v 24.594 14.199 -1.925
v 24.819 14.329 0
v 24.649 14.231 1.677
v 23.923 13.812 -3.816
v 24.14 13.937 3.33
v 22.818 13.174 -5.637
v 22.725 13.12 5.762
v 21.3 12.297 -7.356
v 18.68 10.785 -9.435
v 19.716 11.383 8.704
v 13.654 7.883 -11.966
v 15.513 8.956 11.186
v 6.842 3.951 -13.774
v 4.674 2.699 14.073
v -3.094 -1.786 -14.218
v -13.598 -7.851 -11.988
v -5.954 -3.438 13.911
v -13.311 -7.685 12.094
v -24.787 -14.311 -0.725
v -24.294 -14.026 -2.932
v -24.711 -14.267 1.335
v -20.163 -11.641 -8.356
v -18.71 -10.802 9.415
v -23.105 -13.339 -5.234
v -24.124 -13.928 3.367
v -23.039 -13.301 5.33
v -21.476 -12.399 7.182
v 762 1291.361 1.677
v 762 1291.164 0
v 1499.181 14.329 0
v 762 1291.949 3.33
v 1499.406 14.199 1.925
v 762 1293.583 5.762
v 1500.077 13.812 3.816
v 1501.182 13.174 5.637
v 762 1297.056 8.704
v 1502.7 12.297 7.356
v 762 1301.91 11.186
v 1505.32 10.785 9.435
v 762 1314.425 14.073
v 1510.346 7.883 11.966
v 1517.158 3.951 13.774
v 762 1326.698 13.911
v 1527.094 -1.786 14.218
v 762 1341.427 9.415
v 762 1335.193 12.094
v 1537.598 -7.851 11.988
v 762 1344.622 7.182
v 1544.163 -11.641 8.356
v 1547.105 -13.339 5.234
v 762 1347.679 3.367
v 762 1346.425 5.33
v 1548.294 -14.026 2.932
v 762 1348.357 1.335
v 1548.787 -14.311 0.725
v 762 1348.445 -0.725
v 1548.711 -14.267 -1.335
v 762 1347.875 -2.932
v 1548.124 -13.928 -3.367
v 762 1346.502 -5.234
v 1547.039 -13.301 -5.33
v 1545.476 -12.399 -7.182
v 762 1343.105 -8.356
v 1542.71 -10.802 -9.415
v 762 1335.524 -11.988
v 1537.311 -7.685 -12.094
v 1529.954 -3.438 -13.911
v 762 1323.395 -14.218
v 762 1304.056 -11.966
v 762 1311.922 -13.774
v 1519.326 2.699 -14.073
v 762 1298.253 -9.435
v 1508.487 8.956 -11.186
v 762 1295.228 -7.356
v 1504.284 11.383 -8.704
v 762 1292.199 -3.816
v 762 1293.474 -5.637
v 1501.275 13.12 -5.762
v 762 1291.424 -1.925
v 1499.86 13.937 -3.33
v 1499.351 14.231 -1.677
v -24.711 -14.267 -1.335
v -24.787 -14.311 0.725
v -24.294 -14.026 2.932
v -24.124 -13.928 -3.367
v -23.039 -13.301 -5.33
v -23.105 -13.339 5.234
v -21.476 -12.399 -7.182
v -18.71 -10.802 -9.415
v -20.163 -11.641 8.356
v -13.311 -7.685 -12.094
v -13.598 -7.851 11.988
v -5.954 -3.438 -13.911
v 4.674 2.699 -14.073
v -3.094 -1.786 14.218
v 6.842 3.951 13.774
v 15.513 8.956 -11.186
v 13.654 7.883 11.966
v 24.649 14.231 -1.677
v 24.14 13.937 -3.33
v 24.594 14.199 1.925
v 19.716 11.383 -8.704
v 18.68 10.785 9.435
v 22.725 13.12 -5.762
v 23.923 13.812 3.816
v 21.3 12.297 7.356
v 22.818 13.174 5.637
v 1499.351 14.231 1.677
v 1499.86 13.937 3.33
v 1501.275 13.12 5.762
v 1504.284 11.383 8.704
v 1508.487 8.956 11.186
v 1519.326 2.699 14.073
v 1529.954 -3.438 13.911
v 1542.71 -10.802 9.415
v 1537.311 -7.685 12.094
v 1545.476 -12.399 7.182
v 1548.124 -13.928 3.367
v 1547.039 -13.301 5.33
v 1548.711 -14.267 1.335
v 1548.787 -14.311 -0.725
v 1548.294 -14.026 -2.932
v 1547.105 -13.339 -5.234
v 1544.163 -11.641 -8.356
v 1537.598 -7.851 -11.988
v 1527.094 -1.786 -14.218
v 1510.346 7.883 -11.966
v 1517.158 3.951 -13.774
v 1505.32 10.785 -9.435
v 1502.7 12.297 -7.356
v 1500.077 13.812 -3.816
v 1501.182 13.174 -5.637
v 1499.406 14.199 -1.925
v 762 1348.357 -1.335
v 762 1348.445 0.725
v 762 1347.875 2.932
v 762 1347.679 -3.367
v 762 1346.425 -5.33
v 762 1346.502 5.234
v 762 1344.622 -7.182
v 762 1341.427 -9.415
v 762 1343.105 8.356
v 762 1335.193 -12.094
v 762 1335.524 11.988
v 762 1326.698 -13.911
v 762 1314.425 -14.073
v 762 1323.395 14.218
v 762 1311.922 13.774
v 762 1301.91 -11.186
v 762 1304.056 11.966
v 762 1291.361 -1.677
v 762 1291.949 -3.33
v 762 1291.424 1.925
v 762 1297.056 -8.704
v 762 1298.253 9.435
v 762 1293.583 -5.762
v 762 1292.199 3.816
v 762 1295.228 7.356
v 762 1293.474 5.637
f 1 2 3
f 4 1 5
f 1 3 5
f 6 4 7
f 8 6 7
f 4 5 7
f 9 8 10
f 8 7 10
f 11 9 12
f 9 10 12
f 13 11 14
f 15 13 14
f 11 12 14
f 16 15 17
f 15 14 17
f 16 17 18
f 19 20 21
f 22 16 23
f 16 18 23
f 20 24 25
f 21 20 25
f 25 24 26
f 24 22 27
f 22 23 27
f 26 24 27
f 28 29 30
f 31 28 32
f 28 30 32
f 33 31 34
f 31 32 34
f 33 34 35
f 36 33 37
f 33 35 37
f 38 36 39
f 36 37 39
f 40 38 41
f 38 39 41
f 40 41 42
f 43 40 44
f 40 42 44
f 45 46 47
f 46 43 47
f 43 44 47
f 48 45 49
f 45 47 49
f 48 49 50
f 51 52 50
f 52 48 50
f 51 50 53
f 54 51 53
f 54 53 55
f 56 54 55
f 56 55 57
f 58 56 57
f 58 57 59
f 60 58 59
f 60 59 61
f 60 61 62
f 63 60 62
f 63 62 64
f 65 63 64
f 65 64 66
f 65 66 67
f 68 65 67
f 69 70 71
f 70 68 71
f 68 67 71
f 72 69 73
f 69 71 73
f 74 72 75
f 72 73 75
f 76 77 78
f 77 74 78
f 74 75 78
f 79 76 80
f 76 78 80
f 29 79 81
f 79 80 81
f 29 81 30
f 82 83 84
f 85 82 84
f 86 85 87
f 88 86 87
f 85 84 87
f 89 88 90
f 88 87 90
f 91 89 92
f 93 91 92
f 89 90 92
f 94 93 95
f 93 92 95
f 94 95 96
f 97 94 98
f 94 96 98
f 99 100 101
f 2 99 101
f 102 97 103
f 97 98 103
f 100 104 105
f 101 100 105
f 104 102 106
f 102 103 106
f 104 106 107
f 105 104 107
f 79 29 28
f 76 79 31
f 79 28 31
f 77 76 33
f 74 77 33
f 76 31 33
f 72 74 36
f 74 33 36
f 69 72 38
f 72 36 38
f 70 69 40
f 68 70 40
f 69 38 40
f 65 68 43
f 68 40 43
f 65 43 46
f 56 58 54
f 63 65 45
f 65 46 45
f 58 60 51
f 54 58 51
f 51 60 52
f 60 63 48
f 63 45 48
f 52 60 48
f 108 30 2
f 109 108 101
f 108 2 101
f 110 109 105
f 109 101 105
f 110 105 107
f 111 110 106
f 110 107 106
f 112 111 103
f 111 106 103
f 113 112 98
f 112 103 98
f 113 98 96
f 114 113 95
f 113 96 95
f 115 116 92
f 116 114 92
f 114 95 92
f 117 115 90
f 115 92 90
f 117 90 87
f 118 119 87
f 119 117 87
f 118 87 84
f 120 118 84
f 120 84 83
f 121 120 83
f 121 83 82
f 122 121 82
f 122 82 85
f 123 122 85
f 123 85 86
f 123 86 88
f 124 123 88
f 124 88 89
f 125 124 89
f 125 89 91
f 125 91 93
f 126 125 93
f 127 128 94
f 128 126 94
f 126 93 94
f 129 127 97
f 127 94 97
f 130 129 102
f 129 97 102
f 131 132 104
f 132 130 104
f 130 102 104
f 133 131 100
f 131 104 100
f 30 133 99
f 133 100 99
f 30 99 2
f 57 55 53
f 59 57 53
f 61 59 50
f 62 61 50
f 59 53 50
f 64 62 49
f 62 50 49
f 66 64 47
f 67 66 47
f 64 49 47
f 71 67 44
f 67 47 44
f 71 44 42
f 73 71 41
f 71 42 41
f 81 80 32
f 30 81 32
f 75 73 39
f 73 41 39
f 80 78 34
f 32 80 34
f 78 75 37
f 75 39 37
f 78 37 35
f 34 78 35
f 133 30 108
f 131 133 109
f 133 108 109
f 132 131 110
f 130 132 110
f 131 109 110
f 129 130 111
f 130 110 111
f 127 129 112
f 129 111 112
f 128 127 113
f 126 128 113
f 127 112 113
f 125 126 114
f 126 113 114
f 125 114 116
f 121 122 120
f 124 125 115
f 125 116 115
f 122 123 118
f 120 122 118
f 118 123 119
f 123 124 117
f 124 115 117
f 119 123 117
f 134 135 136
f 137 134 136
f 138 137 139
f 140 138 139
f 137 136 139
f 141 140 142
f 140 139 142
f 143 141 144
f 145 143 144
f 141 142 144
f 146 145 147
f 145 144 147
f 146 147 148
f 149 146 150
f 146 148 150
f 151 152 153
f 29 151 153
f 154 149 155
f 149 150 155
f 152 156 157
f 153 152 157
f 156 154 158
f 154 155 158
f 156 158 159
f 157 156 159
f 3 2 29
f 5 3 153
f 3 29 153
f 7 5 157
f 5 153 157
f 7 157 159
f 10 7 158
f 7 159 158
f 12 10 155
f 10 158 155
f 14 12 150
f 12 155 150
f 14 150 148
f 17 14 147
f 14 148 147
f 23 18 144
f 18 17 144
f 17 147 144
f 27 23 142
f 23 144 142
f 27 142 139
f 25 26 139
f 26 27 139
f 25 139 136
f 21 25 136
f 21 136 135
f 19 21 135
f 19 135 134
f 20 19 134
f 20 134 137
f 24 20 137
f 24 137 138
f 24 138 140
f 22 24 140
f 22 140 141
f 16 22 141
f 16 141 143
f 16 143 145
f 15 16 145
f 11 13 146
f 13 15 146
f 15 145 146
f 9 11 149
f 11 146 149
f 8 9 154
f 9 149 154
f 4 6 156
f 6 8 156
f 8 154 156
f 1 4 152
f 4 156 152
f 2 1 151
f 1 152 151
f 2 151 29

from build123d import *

# Parameters (mm, degrees)
STRUCTURAL_MEMBER1_DEPTH      = 1560.099742815
STRUCTURAL_MEMBER1_DEPTH_BACK = 36.099742815
SKETCH11_R                    = 14.32941
SKETCH11_ON_SEGMENT_2_R       = 14.32941
STRUCTURAL_MEMBER1_2_DEPTH    = 1596.19948563
SKETCH11_ON_SEGMENT_3_R       = 14.32941
STRUCTURAL_MEMBER1_3_DEPTH    = 1596.19948563


with BuildPart() as part:
    # Sketch11 → Structural Member1 (new, two sides: drawn at the far end of the back side and taken through both)
    with BuildSketch(Plane(origin=(762, 1319.822715367, 0), x_dir=(0.8660254037844399, -0.49999999999999784, 0), z_dir=(-0.49999999999999784, -0.8660254037844399, 0)).offset(-STRUCTURAL_MEMBER1_DEPTH_BACK)):
        Circle(SKETCH11_R)
    extrude(amount=STRUCTURAL_MEMBER1_DEPTH + STRUCTURAL_MEMBER1_DEPTH_BACK)

    # Structural Member1 mitre 1
    split(bisect_by=Plane(origin=(762, 1319.822715367, 0), x_dir=(0, -1, 0), z_dir=(-1, 0, 0)), keep=Keep.TOP)

    # Structural Member1 mitre 2
    split(bisect_by=Plane(origin=(0, 0, 0), x_dir=(-0.866025404, -0.5, 0), z_dir=(-0.5, 0.866025404, 0)), keep=Keep.TOP)


with BuildPart() as body_2:
    # Sketch11 on segment 2 (carried to segment 2) → Structural Member1 2 (new body)
    with BuildSketch(Plane.YZ.offset(-36.099742815)):
        Circle(SKETCH11_ON_SEGMENT_2_R)
    extrude(amount=STRUCTURAL_MEMBER1_2_DEPTH)

    # Structural Member1 2 mitre 1
    split(bisect_by=Plane(origin=(0, 0, 0), x_dir=(0.866025404, 0.5, 0), z_dir=(0.5, -0.866025404, 0)), keep=Keep.TOP)

    # Structural Member1 2 mitre 2
    split(bisect_by=Plane(origin=(1524, 0, 0), x_dir=(0.866025404, -0.5, 0), z_dir=(-0.5, -0.866025404, 0)), keep=Keep.TOP)


with BuildPart() as body_3:
    # Sketch11 on segment 3 (carried to segment 3) → Structural Member1 3 (new body)
    with BuildSketch(Plane(origin=(1542.049871408, -31.263294348, 0), x_dir=(-0.866025404, -0.5, 0), z_dir=(-0.5, 0.866025404, 0))):
        Circle(SKETCH11_ON_SEGMENT_3_R)
    extrude(amount=STRUCTURAL_MEMBER1_3_DEPTH)

    # Structural Member1 3 mitre 1
    split(bisect_by=Plane(origin=(1524, 0, 0), x_dir=(-0.866025404, 0.5, 0), z_dir=(0.5, 0.866025404, 0)), keep=Keep.TOP)

    # Structural Member1 3 mitre 2
    split(bisect_by=Plane(origin=(762, 1319.822715367, 0), x_dir=(0, 1, 0), z_dir=(1, 0, 0)), keep=Keep.TOP)


solid = Compound([part.part, body_2.part, body_3.part])
